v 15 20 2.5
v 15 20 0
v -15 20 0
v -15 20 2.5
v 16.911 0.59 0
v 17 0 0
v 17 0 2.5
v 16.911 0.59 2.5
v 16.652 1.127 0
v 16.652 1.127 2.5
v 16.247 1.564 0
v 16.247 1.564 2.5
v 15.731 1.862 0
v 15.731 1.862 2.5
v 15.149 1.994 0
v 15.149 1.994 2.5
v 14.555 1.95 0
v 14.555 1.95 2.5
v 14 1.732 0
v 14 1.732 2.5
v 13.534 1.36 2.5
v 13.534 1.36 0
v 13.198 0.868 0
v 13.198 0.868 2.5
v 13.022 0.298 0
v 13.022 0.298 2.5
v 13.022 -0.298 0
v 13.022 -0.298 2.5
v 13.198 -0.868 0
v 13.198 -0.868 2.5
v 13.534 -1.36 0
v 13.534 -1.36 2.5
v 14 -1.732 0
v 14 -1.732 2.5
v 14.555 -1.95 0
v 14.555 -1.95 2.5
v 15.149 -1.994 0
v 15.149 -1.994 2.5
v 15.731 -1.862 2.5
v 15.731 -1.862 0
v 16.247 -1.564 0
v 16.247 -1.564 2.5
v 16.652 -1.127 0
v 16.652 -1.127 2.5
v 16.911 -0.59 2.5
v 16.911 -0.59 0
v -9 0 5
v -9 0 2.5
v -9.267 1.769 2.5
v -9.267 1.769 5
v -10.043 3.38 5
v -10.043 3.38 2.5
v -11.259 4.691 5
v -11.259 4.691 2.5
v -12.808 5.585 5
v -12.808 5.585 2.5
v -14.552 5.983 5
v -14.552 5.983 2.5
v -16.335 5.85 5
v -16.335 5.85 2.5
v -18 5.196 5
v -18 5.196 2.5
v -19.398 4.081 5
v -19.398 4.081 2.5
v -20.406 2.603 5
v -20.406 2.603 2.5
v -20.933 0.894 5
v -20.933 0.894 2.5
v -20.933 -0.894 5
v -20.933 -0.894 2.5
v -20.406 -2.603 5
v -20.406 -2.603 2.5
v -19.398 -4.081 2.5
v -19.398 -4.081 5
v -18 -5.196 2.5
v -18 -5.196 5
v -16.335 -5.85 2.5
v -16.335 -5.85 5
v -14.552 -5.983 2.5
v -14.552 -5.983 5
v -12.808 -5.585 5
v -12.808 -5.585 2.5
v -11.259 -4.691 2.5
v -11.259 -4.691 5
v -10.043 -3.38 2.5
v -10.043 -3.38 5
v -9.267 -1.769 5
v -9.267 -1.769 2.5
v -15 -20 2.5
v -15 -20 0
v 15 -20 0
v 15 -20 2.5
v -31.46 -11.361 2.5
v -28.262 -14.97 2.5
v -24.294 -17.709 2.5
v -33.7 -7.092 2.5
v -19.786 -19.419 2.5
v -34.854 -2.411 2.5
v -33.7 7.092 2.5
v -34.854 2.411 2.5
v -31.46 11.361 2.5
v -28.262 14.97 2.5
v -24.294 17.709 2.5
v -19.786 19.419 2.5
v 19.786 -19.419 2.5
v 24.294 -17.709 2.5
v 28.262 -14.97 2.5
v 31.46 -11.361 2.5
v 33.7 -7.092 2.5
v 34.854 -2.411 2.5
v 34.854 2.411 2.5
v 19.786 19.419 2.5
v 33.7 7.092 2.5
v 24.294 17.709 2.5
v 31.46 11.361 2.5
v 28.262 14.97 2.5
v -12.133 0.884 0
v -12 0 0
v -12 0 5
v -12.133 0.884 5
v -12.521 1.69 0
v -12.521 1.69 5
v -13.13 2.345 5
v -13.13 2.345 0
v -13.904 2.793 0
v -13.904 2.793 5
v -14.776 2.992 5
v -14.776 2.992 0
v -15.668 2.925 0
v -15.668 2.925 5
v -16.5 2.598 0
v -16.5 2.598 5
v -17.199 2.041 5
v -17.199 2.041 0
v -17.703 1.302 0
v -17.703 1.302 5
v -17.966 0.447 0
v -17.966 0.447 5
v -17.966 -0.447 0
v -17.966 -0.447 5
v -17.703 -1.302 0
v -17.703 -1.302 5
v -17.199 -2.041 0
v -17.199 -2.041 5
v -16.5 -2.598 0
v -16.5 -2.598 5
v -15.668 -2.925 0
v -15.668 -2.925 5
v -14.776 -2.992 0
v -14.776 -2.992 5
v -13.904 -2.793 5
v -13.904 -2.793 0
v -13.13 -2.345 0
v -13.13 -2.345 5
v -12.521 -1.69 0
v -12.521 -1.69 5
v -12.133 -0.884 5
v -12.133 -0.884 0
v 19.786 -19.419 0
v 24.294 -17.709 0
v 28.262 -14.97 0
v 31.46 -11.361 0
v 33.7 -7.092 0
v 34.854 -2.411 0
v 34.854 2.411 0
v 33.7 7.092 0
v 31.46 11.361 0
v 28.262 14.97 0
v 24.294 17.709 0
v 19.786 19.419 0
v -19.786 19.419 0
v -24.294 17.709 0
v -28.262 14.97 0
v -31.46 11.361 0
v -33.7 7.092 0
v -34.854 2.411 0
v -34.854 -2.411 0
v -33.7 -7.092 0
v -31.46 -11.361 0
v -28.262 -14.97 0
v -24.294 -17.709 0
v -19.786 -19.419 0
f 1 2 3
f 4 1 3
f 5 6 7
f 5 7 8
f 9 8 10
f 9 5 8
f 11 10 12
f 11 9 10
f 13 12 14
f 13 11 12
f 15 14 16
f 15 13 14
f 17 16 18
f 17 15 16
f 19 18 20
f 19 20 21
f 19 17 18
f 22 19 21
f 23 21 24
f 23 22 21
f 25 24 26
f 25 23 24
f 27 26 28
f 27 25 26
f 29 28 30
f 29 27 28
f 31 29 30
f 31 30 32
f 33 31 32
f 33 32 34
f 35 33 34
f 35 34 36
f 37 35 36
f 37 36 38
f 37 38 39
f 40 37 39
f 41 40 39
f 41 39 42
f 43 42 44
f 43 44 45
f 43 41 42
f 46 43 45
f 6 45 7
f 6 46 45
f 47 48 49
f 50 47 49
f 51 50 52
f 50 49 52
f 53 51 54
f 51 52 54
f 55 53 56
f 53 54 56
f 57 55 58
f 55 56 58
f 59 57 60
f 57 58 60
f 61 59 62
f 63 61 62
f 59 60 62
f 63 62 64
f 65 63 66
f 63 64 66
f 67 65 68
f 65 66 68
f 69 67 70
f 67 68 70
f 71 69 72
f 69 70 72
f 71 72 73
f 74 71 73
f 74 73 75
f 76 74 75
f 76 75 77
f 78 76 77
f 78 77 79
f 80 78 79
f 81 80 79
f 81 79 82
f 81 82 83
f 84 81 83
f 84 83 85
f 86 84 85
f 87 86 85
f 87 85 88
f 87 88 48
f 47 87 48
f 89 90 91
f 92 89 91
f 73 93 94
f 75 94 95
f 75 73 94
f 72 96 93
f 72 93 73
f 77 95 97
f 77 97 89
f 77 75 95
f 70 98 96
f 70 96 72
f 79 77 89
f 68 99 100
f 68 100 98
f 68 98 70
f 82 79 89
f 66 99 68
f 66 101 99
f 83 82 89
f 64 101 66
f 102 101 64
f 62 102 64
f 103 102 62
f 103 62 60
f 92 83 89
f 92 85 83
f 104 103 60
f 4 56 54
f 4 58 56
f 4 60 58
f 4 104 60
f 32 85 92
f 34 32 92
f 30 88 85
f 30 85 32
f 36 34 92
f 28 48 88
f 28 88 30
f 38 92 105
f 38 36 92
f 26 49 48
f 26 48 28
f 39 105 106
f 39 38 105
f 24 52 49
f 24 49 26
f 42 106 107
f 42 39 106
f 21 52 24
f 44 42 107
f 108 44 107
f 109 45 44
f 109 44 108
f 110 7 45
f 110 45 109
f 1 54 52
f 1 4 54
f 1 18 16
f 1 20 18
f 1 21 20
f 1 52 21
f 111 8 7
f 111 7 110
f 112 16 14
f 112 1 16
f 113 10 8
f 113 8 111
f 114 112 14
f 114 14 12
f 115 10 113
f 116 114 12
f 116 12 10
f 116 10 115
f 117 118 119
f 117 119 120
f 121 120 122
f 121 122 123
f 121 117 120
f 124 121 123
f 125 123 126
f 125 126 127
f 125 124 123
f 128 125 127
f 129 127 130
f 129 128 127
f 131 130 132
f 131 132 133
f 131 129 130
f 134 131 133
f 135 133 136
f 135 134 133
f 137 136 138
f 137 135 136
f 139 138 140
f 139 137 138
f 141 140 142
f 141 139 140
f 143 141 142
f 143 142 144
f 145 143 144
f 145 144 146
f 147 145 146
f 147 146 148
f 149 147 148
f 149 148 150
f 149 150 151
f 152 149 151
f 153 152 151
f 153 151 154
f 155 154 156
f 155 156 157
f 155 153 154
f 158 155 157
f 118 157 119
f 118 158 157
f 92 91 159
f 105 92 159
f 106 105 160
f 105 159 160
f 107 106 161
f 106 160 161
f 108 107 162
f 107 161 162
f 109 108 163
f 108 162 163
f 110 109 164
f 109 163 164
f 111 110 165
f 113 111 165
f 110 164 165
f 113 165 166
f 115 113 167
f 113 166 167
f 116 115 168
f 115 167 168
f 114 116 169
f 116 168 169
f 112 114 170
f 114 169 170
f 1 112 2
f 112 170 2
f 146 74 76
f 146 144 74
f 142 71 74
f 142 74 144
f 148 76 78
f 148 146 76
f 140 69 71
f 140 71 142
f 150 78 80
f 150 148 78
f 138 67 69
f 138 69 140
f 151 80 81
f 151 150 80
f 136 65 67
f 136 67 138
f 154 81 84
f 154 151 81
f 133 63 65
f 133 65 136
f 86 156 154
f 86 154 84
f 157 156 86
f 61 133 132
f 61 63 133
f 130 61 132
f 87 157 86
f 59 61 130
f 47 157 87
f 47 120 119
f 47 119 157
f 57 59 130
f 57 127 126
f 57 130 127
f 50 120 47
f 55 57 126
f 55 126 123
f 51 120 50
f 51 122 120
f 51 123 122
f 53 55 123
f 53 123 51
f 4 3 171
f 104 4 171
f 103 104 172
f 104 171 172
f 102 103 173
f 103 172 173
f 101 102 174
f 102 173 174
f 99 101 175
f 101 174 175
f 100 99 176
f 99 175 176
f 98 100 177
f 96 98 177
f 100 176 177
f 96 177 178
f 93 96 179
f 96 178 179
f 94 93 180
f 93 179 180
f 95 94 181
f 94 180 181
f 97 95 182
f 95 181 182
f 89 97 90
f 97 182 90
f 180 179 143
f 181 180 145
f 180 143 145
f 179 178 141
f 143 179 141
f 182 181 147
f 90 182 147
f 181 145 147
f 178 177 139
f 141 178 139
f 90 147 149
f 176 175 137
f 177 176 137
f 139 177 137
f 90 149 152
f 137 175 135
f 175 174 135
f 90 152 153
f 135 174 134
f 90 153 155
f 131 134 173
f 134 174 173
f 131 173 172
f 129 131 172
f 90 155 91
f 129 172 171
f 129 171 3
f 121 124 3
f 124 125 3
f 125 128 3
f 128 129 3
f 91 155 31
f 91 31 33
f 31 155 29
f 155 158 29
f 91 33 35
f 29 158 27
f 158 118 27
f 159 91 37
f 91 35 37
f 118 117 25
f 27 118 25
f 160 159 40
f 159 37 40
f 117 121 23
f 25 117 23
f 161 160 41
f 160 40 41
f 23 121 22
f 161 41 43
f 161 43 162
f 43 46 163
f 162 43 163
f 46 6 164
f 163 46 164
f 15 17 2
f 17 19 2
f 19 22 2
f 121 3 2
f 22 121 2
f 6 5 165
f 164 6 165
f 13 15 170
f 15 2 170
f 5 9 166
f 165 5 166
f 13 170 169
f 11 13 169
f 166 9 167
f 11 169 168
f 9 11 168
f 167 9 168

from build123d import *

# Parameters (mm, degrees)
F0_R     = 6
F0_R_2   = 2
F1_DEPTH = 2.5
F0_R_3   = 3
F2_DEPTH = 5


with BuildPart() as f1:
    # F0 (on Top) → F1 (new body)
    with BuildSketch(Plane.XY):
        with BuildLine():
            Line((15, 20), (-15, 20))
            ThreePointArc((-15, 20), (-35, 0), (-15, -20))
            Line((-15, -20), (15, -20))
            ThreePointArc((15, -20), (35, 0), (15, 20))
        make_face()
        with Locations((-15, 0)):
            Circle(F0_R, mode=Mode.SUBTRACT)
        with Locations((15, 0)):
            Circle(F0_R_2, mode=Mode.SUBTRACT)
    extrude(amount=F1_DEPTH)

    # F0 (on Top) → F2 (join)
    with BuildSketch(Plane.XY):
        with Locations((-15, 0)):
            Circle(F0_R)
        with Locations((-15, 0)):
            Circle(F0_R_3, mode=Mode.SUBTRACT)
    extrude(amount=F2_DEPTH)


solid = f1.part
